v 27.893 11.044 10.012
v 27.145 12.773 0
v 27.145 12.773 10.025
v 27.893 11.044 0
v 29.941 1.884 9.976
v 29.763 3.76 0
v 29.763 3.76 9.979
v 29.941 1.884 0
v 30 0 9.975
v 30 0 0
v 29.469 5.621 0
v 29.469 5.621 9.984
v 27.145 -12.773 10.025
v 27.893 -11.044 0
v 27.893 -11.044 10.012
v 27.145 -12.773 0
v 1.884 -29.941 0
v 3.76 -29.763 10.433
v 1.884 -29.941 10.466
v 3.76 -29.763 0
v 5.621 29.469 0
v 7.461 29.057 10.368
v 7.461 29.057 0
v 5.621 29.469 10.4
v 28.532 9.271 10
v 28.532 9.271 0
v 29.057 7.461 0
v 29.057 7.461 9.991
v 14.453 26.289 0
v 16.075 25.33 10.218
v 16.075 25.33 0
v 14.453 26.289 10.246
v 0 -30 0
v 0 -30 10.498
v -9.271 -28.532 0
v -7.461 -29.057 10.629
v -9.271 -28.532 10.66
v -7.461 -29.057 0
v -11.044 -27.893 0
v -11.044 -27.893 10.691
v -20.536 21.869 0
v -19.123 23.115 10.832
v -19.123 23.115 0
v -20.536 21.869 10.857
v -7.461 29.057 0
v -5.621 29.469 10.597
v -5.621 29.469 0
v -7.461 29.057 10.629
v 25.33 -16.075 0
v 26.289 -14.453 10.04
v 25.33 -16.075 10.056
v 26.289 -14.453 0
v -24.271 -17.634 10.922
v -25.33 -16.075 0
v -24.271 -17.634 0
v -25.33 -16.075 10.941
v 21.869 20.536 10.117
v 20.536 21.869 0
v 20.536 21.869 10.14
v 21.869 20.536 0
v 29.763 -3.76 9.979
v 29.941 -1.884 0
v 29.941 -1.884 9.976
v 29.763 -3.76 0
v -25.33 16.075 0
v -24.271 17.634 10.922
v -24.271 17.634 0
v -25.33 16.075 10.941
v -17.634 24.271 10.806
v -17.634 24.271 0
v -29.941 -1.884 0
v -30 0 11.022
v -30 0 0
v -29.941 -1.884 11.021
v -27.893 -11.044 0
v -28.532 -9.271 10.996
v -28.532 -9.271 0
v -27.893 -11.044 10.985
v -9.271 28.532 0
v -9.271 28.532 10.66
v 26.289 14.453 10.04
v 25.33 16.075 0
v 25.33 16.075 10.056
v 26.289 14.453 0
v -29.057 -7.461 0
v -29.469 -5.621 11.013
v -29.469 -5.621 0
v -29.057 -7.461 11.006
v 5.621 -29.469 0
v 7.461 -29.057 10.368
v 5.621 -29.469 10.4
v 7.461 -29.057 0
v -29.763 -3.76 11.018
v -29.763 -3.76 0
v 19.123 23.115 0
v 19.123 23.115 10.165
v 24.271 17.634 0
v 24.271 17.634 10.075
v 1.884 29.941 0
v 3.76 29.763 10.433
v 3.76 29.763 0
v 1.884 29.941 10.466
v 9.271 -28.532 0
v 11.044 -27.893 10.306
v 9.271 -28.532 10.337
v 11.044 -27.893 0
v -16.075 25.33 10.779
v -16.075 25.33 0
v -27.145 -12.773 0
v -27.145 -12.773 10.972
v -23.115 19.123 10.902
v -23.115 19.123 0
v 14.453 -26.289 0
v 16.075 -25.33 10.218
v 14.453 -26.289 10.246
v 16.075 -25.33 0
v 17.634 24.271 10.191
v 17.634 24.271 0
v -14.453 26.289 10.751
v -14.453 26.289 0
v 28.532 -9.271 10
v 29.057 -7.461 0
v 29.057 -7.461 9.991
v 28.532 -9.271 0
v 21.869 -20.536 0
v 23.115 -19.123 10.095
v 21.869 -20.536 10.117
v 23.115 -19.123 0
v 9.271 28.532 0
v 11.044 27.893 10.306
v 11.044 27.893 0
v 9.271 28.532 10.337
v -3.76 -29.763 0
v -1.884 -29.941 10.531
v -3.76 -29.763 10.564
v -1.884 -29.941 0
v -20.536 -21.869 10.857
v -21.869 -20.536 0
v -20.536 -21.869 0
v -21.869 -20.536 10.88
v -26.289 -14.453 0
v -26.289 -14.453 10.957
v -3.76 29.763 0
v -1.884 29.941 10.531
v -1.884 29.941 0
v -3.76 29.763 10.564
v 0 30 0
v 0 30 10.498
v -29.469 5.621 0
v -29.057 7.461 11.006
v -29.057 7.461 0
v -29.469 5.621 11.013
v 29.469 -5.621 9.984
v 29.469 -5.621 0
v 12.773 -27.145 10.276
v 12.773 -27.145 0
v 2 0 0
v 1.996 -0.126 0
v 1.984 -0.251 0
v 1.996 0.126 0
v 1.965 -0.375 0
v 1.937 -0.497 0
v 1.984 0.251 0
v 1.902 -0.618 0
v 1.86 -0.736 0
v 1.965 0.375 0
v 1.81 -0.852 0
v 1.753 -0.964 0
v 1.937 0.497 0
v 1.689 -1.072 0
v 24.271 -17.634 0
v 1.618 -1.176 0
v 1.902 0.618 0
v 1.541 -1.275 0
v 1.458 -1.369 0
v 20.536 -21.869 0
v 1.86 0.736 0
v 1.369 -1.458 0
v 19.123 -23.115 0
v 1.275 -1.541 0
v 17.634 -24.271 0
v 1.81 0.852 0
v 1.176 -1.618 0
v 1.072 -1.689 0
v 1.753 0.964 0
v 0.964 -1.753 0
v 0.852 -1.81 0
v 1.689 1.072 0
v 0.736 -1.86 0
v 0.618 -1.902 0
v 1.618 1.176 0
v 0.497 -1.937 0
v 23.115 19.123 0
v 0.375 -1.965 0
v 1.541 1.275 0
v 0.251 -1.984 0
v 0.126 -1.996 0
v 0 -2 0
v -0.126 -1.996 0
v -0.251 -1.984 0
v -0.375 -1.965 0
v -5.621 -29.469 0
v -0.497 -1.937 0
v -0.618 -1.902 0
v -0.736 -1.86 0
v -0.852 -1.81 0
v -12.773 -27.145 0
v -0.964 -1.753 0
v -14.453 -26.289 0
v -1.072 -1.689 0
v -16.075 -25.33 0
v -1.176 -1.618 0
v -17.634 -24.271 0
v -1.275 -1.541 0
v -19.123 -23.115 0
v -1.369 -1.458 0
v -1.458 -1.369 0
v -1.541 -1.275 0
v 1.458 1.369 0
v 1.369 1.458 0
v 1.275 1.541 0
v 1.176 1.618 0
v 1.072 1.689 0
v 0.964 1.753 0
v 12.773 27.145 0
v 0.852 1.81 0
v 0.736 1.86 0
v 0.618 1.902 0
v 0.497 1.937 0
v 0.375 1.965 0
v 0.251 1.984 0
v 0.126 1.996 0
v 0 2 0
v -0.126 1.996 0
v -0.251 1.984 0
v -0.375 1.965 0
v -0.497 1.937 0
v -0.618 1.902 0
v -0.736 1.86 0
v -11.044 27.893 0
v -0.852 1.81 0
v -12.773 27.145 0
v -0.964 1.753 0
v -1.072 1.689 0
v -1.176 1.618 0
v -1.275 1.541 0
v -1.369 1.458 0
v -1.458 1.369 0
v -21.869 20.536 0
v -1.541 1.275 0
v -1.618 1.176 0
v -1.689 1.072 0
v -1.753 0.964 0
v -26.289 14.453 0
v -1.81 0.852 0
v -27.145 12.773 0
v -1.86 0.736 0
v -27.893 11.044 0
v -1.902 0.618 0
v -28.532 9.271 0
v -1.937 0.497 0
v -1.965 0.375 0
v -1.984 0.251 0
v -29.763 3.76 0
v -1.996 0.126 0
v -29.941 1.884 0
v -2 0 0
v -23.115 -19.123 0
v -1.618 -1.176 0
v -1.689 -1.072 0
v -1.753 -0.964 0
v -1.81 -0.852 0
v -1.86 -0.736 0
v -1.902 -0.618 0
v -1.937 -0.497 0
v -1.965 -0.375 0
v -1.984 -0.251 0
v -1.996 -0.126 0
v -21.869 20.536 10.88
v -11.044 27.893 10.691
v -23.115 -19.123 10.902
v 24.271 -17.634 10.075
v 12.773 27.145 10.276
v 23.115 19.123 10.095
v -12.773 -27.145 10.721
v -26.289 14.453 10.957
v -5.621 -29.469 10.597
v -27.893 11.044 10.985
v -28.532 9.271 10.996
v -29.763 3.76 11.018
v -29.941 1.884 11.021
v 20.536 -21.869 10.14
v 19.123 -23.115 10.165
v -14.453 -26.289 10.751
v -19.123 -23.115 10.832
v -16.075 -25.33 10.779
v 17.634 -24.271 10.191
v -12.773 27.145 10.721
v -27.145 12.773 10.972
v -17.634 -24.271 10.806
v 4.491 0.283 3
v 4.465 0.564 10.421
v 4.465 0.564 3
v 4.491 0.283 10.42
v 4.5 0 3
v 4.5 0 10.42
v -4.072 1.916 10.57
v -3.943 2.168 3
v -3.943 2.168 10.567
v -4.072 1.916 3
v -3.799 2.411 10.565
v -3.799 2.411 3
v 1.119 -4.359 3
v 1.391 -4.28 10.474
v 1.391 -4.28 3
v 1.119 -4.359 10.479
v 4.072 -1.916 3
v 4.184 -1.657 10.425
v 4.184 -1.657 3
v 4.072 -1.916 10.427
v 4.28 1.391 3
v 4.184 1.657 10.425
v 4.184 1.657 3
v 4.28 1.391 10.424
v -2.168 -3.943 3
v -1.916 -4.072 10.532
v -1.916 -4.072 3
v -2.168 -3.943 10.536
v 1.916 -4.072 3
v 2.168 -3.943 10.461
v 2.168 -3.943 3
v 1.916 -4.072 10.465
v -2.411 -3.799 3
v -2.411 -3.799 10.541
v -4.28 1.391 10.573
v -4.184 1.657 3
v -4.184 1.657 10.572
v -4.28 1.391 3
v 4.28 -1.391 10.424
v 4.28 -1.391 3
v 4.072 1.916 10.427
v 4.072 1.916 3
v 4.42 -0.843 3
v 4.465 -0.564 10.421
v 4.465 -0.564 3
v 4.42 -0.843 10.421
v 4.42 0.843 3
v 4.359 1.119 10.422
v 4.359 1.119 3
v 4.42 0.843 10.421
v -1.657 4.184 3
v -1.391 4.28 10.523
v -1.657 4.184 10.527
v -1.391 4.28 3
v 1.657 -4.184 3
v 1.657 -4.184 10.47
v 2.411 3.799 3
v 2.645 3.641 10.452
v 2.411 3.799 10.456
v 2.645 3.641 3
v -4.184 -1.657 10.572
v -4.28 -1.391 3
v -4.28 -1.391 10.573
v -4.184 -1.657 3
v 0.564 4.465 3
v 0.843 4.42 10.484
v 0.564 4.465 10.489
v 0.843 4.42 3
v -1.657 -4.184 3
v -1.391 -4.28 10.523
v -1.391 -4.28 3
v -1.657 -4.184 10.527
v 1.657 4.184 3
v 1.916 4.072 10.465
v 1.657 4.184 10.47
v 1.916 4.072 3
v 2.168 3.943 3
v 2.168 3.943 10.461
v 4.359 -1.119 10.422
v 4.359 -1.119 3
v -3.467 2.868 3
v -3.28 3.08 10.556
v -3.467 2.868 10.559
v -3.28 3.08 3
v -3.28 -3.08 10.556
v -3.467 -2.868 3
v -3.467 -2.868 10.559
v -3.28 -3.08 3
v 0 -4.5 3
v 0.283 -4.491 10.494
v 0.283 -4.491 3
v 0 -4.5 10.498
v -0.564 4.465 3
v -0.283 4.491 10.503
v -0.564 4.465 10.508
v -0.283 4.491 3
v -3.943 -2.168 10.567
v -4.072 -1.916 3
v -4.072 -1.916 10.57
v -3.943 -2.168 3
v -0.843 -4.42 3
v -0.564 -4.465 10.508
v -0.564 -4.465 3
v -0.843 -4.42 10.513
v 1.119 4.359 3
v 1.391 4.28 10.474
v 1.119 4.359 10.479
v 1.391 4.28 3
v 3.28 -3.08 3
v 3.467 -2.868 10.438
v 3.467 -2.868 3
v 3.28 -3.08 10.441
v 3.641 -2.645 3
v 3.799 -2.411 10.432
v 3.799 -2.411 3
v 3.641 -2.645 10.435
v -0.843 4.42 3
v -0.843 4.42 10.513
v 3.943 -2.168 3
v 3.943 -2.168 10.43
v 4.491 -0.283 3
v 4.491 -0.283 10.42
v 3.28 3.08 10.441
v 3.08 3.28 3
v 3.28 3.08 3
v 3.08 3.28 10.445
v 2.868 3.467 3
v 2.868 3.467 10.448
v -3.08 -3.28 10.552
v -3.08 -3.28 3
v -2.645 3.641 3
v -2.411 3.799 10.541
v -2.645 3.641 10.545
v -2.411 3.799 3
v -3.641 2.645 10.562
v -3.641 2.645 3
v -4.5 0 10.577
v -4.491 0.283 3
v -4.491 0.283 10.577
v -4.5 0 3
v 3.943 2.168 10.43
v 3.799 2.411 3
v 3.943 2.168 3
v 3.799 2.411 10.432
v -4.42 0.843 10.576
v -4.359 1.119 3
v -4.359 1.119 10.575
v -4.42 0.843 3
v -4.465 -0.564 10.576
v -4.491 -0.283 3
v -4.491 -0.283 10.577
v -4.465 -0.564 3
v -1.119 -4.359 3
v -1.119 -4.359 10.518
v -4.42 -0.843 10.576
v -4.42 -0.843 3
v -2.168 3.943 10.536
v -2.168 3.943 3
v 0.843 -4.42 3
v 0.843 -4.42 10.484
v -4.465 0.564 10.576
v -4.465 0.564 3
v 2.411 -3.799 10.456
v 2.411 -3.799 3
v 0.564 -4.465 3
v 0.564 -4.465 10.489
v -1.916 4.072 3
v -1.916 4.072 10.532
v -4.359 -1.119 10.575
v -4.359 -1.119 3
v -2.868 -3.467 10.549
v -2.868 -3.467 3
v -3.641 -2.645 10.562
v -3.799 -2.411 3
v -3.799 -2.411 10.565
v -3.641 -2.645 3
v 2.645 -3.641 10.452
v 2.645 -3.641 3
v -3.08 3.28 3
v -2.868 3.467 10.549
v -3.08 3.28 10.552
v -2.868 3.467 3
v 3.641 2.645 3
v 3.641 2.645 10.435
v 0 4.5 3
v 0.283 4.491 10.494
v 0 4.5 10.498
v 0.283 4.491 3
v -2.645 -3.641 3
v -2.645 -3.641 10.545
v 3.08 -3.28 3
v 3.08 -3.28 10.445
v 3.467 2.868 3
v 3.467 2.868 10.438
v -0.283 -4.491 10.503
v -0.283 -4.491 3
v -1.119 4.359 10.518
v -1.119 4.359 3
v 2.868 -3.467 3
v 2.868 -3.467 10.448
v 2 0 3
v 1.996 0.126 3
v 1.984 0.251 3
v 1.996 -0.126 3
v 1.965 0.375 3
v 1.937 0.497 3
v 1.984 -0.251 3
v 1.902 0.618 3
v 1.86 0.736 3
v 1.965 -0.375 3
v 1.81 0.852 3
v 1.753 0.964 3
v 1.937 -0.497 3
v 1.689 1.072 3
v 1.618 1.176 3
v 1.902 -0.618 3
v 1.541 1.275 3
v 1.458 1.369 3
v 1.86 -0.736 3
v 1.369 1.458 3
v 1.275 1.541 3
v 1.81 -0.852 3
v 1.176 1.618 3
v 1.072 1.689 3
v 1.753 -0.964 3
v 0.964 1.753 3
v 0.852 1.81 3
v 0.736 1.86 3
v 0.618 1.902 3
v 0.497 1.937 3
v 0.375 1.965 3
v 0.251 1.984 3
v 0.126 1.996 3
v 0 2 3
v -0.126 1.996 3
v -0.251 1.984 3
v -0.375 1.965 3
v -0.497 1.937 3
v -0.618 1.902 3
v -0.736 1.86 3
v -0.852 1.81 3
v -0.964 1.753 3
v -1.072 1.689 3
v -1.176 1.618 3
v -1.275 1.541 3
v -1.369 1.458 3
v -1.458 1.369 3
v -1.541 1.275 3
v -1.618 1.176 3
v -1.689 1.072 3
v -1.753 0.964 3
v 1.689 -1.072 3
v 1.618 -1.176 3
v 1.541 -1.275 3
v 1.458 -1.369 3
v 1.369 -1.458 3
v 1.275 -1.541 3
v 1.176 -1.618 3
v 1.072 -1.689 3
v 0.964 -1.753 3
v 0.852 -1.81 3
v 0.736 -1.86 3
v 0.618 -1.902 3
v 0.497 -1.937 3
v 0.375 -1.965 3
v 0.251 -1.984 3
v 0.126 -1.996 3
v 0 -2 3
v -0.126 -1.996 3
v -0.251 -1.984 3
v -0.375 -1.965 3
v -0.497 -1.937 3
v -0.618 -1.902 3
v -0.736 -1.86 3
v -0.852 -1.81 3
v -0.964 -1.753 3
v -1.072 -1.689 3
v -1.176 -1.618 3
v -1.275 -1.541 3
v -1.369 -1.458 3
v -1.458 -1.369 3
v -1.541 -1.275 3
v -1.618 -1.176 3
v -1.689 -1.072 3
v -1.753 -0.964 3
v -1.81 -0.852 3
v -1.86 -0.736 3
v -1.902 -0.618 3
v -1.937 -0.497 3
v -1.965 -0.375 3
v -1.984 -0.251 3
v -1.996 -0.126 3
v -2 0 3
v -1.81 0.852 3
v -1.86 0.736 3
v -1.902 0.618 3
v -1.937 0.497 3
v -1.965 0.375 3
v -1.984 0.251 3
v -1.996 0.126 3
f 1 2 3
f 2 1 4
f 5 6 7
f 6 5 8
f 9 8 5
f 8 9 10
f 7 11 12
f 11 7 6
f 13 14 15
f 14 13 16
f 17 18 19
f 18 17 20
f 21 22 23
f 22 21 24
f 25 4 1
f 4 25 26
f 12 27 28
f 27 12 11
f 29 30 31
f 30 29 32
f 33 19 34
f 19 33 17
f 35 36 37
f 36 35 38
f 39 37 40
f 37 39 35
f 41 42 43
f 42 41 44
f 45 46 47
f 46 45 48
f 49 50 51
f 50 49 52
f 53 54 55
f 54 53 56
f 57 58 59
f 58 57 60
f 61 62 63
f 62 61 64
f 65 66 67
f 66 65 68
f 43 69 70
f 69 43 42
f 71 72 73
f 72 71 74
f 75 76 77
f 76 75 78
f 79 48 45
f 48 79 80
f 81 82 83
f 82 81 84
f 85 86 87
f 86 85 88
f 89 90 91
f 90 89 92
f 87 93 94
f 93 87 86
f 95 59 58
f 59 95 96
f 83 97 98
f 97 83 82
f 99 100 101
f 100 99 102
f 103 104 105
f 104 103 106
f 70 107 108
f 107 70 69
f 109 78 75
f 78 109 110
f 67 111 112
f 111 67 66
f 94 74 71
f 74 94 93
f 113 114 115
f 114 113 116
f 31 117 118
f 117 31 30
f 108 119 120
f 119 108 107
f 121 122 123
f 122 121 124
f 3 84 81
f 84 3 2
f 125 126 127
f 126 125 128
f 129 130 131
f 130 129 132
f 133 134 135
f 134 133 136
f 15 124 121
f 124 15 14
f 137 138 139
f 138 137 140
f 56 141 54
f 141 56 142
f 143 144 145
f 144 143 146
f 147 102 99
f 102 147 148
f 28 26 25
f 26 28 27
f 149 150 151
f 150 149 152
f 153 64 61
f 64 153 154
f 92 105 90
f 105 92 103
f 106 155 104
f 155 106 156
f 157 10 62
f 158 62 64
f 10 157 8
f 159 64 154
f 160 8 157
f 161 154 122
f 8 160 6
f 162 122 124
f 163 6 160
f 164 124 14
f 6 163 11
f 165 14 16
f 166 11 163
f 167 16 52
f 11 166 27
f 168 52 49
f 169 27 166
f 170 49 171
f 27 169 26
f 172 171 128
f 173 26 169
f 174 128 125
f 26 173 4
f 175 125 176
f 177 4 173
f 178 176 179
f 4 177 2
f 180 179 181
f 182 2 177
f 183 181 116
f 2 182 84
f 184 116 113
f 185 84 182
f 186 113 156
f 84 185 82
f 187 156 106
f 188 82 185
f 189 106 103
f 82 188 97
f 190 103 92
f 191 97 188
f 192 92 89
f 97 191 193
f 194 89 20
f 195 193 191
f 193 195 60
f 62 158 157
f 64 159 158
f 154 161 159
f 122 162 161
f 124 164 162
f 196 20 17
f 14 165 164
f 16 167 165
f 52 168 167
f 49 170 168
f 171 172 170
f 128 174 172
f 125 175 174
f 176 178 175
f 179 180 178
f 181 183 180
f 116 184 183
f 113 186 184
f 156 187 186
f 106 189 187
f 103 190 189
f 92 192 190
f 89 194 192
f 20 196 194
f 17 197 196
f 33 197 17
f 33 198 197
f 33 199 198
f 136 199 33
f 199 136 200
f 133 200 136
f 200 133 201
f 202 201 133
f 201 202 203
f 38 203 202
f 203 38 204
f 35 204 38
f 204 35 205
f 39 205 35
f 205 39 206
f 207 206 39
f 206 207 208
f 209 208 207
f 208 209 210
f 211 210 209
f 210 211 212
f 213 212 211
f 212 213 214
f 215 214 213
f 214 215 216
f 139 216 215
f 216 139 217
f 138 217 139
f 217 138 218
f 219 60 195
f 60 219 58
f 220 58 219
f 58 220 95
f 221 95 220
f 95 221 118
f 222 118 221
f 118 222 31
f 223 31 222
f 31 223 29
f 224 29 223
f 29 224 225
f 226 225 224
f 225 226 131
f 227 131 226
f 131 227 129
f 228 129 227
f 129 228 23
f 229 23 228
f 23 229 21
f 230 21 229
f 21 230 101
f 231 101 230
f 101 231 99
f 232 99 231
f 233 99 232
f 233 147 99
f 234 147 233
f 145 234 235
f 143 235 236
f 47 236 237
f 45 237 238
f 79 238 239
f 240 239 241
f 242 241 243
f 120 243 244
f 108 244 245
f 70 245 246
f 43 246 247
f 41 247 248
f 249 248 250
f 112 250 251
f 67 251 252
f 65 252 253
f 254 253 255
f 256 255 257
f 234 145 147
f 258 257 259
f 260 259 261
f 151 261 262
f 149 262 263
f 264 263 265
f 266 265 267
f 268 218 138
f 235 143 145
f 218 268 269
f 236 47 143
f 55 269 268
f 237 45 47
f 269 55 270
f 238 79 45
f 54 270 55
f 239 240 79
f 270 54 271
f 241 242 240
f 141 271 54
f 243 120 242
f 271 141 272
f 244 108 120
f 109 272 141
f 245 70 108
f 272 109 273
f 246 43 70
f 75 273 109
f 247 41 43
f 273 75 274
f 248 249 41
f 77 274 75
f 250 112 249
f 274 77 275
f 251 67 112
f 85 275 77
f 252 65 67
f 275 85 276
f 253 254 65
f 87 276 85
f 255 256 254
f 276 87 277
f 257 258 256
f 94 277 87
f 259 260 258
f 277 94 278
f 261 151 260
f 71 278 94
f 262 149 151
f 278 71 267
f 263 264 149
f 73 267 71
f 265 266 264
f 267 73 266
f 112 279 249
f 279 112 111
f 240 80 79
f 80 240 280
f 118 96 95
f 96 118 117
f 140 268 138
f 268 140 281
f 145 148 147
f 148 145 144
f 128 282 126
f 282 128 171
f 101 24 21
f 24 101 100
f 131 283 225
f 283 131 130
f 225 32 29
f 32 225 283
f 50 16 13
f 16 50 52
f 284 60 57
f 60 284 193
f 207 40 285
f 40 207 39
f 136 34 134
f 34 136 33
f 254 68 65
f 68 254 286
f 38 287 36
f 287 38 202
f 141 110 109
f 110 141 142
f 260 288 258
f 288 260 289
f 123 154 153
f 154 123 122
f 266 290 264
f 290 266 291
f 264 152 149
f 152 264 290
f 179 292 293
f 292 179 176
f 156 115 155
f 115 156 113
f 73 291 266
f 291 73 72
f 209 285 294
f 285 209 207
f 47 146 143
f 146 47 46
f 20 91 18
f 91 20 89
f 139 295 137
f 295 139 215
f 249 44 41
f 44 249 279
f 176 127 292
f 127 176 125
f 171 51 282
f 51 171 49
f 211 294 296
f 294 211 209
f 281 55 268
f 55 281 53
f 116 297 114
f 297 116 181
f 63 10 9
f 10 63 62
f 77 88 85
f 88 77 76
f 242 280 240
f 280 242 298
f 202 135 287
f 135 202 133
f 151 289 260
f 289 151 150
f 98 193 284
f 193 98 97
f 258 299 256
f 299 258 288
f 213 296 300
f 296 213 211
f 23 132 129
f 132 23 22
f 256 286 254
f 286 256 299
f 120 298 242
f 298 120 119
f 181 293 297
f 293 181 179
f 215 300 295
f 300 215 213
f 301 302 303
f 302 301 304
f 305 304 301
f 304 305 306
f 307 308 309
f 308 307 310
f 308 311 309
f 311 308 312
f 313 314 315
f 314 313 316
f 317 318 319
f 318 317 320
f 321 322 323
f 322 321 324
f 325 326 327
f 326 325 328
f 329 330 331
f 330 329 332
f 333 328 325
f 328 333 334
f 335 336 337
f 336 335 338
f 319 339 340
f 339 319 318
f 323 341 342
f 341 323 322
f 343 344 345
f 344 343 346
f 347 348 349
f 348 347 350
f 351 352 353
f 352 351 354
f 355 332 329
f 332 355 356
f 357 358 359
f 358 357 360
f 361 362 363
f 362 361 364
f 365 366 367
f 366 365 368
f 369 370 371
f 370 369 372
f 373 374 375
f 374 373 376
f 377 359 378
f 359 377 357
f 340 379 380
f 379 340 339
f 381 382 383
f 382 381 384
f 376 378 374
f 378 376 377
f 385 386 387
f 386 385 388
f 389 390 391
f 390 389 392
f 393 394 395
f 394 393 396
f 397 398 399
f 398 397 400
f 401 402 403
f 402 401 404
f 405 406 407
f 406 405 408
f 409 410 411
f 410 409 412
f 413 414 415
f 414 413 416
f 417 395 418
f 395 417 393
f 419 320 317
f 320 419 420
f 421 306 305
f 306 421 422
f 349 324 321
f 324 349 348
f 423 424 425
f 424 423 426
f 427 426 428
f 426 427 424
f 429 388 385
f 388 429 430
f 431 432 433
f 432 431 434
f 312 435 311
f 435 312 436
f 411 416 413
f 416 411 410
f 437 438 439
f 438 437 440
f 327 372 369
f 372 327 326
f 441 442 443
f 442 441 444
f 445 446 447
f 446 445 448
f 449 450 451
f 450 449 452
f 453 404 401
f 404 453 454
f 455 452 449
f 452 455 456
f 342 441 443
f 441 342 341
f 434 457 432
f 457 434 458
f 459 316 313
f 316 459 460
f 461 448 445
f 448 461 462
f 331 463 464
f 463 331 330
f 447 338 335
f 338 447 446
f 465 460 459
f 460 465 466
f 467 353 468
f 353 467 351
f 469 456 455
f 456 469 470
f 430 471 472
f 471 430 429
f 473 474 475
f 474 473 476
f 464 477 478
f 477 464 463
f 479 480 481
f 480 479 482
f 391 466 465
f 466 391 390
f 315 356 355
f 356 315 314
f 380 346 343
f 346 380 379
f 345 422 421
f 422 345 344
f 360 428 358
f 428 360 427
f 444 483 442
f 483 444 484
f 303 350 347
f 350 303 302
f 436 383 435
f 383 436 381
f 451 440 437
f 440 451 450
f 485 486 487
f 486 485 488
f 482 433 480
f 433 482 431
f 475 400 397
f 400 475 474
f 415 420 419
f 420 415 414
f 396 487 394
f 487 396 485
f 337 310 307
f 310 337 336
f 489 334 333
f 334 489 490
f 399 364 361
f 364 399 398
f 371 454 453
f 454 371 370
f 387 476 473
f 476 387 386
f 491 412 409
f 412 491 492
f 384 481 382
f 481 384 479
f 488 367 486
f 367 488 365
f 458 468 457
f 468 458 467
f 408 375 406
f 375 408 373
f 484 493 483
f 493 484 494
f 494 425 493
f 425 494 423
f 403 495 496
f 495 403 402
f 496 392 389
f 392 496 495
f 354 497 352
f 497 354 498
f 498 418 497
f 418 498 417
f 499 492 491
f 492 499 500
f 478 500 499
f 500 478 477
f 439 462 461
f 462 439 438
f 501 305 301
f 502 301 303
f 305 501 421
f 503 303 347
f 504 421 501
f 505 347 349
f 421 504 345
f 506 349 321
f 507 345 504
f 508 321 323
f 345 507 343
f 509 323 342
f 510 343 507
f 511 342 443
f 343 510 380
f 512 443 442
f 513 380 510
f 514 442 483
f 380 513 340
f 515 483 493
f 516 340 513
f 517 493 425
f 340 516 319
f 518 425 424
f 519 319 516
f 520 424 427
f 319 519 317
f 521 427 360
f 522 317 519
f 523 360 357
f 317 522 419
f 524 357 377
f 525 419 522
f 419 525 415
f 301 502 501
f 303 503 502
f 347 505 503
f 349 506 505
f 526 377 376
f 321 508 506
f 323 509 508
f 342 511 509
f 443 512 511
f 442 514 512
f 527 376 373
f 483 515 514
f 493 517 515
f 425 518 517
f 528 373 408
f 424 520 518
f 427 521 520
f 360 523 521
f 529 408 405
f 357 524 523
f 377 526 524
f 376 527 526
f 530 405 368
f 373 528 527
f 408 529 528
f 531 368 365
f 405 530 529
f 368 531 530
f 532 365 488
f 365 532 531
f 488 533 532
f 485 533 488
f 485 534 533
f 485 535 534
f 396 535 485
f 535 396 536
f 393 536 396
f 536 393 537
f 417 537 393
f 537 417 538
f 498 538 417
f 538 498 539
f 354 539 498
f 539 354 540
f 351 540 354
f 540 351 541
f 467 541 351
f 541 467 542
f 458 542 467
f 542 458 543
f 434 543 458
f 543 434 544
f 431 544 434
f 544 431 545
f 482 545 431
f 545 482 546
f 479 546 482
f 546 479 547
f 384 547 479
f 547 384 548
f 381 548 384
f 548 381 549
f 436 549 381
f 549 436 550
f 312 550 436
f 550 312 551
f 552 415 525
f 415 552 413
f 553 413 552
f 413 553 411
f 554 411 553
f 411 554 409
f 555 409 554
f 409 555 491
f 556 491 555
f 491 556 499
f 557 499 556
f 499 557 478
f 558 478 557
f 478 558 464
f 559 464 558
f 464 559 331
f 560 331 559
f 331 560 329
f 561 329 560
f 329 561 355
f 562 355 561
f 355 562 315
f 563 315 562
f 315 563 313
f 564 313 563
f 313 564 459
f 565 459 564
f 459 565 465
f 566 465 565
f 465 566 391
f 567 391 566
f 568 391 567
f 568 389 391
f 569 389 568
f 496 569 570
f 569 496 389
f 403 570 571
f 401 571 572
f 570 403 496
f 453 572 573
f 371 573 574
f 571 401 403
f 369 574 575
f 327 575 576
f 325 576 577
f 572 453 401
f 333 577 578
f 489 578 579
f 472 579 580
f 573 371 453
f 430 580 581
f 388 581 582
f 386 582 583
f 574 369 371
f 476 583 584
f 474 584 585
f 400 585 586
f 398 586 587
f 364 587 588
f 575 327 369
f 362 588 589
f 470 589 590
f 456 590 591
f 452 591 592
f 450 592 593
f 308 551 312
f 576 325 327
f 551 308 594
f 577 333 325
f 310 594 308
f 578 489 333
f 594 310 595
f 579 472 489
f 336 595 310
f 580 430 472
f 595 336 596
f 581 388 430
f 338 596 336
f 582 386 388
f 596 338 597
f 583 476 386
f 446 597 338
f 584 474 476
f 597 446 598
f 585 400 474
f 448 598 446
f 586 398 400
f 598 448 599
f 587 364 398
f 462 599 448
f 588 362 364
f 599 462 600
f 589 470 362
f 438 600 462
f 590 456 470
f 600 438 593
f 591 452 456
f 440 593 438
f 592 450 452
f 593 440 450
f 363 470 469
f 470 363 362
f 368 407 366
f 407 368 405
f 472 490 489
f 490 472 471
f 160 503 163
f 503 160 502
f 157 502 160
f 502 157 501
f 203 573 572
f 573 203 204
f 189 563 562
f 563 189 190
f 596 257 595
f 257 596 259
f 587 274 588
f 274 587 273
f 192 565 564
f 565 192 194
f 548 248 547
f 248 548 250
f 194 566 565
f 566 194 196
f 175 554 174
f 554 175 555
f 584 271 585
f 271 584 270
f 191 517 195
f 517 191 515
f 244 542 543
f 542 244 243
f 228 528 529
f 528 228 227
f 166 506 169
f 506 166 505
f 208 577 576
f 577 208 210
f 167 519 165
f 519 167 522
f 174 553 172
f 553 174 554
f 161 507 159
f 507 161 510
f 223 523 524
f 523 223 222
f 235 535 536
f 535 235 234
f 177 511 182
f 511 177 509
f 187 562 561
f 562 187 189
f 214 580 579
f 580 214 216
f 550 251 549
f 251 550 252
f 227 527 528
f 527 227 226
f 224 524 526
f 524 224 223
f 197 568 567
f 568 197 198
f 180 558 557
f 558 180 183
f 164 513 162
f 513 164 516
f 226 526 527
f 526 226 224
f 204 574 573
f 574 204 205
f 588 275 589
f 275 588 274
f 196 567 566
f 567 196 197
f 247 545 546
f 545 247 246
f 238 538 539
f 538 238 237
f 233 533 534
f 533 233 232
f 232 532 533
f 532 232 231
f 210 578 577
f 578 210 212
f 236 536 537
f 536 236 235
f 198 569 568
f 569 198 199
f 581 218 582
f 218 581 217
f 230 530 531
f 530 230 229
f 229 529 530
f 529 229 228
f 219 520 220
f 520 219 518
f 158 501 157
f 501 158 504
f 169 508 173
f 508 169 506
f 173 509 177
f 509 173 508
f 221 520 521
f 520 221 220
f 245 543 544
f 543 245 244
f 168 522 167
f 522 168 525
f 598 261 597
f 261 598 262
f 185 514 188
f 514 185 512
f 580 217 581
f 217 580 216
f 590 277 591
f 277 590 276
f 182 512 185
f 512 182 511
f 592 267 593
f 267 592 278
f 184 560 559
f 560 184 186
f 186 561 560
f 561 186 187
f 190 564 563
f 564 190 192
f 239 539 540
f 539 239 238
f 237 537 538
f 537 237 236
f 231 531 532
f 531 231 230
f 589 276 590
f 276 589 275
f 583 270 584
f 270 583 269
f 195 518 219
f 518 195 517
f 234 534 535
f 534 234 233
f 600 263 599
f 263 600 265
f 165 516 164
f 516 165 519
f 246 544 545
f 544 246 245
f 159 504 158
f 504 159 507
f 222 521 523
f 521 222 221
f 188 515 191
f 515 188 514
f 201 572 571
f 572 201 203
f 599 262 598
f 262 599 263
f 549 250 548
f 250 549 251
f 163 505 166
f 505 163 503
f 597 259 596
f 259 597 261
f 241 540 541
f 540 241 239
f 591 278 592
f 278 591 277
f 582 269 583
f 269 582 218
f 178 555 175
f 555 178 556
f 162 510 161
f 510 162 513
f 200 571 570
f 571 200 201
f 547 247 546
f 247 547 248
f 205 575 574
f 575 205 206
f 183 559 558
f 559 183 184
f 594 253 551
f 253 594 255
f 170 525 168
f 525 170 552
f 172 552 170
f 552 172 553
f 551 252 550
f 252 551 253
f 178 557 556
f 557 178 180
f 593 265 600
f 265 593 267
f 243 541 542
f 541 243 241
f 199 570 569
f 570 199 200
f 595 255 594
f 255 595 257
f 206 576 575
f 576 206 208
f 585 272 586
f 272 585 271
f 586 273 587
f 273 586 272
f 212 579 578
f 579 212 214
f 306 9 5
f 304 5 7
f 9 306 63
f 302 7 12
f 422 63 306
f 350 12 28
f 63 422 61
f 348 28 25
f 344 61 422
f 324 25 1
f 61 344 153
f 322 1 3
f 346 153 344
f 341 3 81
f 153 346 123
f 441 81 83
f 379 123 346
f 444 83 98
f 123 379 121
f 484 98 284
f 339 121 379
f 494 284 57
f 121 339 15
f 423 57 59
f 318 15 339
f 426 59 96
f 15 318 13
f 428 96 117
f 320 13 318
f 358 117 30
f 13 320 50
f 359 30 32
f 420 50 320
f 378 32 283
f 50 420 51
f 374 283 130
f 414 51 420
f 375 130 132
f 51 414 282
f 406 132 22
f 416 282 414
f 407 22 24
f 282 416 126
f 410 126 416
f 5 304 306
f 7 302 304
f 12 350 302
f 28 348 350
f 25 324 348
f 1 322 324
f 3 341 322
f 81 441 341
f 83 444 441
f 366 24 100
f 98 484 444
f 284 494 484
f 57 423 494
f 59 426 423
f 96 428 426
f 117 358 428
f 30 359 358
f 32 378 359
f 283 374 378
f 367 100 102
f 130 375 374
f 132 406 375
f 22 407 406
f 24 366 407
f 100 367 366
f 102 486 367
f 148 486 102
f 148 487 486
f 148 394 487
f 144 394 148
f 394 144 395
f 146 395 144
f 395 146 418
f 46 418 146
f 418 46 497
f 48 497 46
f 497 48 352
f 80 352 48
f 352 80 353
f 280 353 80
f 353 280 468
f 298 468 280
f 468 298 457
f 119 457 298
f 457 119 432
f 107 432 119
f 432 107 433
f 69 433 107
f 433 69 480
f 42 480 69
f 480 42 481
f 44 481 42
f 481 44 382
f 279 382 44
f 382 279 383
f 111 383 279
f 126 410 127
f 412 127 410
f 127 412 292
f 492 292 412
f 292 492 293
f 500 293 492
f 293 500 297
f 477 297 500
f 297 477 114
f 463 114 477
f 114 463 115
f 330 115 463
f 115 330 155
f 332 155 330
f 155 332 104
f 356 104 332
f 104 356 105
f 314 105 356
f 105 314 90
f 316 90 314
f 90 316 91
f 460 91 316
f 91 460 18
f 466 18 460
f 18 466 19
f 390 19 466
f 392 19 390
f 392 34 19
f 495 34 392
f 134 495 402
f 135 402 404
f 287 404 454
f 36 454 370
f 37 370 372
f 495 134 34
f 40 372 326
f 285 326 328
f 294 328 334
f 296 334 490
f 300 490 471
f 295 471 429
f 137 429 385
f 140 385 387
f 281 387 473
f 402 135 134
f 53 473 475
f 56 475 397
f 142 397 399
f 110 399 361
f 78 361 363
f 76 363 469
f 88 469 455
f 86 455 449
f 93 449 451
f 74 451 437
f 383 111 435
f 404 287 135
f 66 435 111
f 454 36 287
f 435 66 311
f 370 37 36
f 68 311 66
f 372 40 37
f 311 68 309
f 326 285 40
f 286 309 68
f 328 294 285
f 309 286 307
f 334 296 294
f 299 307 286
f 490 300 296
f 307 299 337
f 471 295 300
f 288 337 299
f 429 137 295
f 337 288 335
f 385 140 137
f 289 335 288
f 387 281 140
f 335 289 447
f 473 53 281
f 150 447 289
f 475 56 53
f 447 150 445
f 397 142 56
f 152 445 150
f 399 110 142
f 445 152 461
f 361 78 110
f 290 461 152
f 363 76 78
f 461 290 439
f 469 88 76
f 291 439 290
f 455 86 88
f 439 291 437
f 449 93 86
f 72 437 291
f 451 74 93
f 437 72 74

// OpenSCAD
height=10;
diameter=60;
screwBodyDiameter=4;
screwHeadDiameter=9;
screwPlatformHeight=3;
rotation=1;

difference() {
    $fn=100;
    cylinder(h=height*2, d=diameter);
    translate([0,0,screwPlatformHeight]) {
        cylinder(h=height*2, d=screwHeadDiameter);
    }
    cylinder(h=height*2, d=screwBodyDiameter);
    translate([0,0,height*2 + rotation/2]) {
        rotate([0,rotation,0]) {
            cube([diameter*2,diameter*2,height*2], center=true);
        }
    }
}
